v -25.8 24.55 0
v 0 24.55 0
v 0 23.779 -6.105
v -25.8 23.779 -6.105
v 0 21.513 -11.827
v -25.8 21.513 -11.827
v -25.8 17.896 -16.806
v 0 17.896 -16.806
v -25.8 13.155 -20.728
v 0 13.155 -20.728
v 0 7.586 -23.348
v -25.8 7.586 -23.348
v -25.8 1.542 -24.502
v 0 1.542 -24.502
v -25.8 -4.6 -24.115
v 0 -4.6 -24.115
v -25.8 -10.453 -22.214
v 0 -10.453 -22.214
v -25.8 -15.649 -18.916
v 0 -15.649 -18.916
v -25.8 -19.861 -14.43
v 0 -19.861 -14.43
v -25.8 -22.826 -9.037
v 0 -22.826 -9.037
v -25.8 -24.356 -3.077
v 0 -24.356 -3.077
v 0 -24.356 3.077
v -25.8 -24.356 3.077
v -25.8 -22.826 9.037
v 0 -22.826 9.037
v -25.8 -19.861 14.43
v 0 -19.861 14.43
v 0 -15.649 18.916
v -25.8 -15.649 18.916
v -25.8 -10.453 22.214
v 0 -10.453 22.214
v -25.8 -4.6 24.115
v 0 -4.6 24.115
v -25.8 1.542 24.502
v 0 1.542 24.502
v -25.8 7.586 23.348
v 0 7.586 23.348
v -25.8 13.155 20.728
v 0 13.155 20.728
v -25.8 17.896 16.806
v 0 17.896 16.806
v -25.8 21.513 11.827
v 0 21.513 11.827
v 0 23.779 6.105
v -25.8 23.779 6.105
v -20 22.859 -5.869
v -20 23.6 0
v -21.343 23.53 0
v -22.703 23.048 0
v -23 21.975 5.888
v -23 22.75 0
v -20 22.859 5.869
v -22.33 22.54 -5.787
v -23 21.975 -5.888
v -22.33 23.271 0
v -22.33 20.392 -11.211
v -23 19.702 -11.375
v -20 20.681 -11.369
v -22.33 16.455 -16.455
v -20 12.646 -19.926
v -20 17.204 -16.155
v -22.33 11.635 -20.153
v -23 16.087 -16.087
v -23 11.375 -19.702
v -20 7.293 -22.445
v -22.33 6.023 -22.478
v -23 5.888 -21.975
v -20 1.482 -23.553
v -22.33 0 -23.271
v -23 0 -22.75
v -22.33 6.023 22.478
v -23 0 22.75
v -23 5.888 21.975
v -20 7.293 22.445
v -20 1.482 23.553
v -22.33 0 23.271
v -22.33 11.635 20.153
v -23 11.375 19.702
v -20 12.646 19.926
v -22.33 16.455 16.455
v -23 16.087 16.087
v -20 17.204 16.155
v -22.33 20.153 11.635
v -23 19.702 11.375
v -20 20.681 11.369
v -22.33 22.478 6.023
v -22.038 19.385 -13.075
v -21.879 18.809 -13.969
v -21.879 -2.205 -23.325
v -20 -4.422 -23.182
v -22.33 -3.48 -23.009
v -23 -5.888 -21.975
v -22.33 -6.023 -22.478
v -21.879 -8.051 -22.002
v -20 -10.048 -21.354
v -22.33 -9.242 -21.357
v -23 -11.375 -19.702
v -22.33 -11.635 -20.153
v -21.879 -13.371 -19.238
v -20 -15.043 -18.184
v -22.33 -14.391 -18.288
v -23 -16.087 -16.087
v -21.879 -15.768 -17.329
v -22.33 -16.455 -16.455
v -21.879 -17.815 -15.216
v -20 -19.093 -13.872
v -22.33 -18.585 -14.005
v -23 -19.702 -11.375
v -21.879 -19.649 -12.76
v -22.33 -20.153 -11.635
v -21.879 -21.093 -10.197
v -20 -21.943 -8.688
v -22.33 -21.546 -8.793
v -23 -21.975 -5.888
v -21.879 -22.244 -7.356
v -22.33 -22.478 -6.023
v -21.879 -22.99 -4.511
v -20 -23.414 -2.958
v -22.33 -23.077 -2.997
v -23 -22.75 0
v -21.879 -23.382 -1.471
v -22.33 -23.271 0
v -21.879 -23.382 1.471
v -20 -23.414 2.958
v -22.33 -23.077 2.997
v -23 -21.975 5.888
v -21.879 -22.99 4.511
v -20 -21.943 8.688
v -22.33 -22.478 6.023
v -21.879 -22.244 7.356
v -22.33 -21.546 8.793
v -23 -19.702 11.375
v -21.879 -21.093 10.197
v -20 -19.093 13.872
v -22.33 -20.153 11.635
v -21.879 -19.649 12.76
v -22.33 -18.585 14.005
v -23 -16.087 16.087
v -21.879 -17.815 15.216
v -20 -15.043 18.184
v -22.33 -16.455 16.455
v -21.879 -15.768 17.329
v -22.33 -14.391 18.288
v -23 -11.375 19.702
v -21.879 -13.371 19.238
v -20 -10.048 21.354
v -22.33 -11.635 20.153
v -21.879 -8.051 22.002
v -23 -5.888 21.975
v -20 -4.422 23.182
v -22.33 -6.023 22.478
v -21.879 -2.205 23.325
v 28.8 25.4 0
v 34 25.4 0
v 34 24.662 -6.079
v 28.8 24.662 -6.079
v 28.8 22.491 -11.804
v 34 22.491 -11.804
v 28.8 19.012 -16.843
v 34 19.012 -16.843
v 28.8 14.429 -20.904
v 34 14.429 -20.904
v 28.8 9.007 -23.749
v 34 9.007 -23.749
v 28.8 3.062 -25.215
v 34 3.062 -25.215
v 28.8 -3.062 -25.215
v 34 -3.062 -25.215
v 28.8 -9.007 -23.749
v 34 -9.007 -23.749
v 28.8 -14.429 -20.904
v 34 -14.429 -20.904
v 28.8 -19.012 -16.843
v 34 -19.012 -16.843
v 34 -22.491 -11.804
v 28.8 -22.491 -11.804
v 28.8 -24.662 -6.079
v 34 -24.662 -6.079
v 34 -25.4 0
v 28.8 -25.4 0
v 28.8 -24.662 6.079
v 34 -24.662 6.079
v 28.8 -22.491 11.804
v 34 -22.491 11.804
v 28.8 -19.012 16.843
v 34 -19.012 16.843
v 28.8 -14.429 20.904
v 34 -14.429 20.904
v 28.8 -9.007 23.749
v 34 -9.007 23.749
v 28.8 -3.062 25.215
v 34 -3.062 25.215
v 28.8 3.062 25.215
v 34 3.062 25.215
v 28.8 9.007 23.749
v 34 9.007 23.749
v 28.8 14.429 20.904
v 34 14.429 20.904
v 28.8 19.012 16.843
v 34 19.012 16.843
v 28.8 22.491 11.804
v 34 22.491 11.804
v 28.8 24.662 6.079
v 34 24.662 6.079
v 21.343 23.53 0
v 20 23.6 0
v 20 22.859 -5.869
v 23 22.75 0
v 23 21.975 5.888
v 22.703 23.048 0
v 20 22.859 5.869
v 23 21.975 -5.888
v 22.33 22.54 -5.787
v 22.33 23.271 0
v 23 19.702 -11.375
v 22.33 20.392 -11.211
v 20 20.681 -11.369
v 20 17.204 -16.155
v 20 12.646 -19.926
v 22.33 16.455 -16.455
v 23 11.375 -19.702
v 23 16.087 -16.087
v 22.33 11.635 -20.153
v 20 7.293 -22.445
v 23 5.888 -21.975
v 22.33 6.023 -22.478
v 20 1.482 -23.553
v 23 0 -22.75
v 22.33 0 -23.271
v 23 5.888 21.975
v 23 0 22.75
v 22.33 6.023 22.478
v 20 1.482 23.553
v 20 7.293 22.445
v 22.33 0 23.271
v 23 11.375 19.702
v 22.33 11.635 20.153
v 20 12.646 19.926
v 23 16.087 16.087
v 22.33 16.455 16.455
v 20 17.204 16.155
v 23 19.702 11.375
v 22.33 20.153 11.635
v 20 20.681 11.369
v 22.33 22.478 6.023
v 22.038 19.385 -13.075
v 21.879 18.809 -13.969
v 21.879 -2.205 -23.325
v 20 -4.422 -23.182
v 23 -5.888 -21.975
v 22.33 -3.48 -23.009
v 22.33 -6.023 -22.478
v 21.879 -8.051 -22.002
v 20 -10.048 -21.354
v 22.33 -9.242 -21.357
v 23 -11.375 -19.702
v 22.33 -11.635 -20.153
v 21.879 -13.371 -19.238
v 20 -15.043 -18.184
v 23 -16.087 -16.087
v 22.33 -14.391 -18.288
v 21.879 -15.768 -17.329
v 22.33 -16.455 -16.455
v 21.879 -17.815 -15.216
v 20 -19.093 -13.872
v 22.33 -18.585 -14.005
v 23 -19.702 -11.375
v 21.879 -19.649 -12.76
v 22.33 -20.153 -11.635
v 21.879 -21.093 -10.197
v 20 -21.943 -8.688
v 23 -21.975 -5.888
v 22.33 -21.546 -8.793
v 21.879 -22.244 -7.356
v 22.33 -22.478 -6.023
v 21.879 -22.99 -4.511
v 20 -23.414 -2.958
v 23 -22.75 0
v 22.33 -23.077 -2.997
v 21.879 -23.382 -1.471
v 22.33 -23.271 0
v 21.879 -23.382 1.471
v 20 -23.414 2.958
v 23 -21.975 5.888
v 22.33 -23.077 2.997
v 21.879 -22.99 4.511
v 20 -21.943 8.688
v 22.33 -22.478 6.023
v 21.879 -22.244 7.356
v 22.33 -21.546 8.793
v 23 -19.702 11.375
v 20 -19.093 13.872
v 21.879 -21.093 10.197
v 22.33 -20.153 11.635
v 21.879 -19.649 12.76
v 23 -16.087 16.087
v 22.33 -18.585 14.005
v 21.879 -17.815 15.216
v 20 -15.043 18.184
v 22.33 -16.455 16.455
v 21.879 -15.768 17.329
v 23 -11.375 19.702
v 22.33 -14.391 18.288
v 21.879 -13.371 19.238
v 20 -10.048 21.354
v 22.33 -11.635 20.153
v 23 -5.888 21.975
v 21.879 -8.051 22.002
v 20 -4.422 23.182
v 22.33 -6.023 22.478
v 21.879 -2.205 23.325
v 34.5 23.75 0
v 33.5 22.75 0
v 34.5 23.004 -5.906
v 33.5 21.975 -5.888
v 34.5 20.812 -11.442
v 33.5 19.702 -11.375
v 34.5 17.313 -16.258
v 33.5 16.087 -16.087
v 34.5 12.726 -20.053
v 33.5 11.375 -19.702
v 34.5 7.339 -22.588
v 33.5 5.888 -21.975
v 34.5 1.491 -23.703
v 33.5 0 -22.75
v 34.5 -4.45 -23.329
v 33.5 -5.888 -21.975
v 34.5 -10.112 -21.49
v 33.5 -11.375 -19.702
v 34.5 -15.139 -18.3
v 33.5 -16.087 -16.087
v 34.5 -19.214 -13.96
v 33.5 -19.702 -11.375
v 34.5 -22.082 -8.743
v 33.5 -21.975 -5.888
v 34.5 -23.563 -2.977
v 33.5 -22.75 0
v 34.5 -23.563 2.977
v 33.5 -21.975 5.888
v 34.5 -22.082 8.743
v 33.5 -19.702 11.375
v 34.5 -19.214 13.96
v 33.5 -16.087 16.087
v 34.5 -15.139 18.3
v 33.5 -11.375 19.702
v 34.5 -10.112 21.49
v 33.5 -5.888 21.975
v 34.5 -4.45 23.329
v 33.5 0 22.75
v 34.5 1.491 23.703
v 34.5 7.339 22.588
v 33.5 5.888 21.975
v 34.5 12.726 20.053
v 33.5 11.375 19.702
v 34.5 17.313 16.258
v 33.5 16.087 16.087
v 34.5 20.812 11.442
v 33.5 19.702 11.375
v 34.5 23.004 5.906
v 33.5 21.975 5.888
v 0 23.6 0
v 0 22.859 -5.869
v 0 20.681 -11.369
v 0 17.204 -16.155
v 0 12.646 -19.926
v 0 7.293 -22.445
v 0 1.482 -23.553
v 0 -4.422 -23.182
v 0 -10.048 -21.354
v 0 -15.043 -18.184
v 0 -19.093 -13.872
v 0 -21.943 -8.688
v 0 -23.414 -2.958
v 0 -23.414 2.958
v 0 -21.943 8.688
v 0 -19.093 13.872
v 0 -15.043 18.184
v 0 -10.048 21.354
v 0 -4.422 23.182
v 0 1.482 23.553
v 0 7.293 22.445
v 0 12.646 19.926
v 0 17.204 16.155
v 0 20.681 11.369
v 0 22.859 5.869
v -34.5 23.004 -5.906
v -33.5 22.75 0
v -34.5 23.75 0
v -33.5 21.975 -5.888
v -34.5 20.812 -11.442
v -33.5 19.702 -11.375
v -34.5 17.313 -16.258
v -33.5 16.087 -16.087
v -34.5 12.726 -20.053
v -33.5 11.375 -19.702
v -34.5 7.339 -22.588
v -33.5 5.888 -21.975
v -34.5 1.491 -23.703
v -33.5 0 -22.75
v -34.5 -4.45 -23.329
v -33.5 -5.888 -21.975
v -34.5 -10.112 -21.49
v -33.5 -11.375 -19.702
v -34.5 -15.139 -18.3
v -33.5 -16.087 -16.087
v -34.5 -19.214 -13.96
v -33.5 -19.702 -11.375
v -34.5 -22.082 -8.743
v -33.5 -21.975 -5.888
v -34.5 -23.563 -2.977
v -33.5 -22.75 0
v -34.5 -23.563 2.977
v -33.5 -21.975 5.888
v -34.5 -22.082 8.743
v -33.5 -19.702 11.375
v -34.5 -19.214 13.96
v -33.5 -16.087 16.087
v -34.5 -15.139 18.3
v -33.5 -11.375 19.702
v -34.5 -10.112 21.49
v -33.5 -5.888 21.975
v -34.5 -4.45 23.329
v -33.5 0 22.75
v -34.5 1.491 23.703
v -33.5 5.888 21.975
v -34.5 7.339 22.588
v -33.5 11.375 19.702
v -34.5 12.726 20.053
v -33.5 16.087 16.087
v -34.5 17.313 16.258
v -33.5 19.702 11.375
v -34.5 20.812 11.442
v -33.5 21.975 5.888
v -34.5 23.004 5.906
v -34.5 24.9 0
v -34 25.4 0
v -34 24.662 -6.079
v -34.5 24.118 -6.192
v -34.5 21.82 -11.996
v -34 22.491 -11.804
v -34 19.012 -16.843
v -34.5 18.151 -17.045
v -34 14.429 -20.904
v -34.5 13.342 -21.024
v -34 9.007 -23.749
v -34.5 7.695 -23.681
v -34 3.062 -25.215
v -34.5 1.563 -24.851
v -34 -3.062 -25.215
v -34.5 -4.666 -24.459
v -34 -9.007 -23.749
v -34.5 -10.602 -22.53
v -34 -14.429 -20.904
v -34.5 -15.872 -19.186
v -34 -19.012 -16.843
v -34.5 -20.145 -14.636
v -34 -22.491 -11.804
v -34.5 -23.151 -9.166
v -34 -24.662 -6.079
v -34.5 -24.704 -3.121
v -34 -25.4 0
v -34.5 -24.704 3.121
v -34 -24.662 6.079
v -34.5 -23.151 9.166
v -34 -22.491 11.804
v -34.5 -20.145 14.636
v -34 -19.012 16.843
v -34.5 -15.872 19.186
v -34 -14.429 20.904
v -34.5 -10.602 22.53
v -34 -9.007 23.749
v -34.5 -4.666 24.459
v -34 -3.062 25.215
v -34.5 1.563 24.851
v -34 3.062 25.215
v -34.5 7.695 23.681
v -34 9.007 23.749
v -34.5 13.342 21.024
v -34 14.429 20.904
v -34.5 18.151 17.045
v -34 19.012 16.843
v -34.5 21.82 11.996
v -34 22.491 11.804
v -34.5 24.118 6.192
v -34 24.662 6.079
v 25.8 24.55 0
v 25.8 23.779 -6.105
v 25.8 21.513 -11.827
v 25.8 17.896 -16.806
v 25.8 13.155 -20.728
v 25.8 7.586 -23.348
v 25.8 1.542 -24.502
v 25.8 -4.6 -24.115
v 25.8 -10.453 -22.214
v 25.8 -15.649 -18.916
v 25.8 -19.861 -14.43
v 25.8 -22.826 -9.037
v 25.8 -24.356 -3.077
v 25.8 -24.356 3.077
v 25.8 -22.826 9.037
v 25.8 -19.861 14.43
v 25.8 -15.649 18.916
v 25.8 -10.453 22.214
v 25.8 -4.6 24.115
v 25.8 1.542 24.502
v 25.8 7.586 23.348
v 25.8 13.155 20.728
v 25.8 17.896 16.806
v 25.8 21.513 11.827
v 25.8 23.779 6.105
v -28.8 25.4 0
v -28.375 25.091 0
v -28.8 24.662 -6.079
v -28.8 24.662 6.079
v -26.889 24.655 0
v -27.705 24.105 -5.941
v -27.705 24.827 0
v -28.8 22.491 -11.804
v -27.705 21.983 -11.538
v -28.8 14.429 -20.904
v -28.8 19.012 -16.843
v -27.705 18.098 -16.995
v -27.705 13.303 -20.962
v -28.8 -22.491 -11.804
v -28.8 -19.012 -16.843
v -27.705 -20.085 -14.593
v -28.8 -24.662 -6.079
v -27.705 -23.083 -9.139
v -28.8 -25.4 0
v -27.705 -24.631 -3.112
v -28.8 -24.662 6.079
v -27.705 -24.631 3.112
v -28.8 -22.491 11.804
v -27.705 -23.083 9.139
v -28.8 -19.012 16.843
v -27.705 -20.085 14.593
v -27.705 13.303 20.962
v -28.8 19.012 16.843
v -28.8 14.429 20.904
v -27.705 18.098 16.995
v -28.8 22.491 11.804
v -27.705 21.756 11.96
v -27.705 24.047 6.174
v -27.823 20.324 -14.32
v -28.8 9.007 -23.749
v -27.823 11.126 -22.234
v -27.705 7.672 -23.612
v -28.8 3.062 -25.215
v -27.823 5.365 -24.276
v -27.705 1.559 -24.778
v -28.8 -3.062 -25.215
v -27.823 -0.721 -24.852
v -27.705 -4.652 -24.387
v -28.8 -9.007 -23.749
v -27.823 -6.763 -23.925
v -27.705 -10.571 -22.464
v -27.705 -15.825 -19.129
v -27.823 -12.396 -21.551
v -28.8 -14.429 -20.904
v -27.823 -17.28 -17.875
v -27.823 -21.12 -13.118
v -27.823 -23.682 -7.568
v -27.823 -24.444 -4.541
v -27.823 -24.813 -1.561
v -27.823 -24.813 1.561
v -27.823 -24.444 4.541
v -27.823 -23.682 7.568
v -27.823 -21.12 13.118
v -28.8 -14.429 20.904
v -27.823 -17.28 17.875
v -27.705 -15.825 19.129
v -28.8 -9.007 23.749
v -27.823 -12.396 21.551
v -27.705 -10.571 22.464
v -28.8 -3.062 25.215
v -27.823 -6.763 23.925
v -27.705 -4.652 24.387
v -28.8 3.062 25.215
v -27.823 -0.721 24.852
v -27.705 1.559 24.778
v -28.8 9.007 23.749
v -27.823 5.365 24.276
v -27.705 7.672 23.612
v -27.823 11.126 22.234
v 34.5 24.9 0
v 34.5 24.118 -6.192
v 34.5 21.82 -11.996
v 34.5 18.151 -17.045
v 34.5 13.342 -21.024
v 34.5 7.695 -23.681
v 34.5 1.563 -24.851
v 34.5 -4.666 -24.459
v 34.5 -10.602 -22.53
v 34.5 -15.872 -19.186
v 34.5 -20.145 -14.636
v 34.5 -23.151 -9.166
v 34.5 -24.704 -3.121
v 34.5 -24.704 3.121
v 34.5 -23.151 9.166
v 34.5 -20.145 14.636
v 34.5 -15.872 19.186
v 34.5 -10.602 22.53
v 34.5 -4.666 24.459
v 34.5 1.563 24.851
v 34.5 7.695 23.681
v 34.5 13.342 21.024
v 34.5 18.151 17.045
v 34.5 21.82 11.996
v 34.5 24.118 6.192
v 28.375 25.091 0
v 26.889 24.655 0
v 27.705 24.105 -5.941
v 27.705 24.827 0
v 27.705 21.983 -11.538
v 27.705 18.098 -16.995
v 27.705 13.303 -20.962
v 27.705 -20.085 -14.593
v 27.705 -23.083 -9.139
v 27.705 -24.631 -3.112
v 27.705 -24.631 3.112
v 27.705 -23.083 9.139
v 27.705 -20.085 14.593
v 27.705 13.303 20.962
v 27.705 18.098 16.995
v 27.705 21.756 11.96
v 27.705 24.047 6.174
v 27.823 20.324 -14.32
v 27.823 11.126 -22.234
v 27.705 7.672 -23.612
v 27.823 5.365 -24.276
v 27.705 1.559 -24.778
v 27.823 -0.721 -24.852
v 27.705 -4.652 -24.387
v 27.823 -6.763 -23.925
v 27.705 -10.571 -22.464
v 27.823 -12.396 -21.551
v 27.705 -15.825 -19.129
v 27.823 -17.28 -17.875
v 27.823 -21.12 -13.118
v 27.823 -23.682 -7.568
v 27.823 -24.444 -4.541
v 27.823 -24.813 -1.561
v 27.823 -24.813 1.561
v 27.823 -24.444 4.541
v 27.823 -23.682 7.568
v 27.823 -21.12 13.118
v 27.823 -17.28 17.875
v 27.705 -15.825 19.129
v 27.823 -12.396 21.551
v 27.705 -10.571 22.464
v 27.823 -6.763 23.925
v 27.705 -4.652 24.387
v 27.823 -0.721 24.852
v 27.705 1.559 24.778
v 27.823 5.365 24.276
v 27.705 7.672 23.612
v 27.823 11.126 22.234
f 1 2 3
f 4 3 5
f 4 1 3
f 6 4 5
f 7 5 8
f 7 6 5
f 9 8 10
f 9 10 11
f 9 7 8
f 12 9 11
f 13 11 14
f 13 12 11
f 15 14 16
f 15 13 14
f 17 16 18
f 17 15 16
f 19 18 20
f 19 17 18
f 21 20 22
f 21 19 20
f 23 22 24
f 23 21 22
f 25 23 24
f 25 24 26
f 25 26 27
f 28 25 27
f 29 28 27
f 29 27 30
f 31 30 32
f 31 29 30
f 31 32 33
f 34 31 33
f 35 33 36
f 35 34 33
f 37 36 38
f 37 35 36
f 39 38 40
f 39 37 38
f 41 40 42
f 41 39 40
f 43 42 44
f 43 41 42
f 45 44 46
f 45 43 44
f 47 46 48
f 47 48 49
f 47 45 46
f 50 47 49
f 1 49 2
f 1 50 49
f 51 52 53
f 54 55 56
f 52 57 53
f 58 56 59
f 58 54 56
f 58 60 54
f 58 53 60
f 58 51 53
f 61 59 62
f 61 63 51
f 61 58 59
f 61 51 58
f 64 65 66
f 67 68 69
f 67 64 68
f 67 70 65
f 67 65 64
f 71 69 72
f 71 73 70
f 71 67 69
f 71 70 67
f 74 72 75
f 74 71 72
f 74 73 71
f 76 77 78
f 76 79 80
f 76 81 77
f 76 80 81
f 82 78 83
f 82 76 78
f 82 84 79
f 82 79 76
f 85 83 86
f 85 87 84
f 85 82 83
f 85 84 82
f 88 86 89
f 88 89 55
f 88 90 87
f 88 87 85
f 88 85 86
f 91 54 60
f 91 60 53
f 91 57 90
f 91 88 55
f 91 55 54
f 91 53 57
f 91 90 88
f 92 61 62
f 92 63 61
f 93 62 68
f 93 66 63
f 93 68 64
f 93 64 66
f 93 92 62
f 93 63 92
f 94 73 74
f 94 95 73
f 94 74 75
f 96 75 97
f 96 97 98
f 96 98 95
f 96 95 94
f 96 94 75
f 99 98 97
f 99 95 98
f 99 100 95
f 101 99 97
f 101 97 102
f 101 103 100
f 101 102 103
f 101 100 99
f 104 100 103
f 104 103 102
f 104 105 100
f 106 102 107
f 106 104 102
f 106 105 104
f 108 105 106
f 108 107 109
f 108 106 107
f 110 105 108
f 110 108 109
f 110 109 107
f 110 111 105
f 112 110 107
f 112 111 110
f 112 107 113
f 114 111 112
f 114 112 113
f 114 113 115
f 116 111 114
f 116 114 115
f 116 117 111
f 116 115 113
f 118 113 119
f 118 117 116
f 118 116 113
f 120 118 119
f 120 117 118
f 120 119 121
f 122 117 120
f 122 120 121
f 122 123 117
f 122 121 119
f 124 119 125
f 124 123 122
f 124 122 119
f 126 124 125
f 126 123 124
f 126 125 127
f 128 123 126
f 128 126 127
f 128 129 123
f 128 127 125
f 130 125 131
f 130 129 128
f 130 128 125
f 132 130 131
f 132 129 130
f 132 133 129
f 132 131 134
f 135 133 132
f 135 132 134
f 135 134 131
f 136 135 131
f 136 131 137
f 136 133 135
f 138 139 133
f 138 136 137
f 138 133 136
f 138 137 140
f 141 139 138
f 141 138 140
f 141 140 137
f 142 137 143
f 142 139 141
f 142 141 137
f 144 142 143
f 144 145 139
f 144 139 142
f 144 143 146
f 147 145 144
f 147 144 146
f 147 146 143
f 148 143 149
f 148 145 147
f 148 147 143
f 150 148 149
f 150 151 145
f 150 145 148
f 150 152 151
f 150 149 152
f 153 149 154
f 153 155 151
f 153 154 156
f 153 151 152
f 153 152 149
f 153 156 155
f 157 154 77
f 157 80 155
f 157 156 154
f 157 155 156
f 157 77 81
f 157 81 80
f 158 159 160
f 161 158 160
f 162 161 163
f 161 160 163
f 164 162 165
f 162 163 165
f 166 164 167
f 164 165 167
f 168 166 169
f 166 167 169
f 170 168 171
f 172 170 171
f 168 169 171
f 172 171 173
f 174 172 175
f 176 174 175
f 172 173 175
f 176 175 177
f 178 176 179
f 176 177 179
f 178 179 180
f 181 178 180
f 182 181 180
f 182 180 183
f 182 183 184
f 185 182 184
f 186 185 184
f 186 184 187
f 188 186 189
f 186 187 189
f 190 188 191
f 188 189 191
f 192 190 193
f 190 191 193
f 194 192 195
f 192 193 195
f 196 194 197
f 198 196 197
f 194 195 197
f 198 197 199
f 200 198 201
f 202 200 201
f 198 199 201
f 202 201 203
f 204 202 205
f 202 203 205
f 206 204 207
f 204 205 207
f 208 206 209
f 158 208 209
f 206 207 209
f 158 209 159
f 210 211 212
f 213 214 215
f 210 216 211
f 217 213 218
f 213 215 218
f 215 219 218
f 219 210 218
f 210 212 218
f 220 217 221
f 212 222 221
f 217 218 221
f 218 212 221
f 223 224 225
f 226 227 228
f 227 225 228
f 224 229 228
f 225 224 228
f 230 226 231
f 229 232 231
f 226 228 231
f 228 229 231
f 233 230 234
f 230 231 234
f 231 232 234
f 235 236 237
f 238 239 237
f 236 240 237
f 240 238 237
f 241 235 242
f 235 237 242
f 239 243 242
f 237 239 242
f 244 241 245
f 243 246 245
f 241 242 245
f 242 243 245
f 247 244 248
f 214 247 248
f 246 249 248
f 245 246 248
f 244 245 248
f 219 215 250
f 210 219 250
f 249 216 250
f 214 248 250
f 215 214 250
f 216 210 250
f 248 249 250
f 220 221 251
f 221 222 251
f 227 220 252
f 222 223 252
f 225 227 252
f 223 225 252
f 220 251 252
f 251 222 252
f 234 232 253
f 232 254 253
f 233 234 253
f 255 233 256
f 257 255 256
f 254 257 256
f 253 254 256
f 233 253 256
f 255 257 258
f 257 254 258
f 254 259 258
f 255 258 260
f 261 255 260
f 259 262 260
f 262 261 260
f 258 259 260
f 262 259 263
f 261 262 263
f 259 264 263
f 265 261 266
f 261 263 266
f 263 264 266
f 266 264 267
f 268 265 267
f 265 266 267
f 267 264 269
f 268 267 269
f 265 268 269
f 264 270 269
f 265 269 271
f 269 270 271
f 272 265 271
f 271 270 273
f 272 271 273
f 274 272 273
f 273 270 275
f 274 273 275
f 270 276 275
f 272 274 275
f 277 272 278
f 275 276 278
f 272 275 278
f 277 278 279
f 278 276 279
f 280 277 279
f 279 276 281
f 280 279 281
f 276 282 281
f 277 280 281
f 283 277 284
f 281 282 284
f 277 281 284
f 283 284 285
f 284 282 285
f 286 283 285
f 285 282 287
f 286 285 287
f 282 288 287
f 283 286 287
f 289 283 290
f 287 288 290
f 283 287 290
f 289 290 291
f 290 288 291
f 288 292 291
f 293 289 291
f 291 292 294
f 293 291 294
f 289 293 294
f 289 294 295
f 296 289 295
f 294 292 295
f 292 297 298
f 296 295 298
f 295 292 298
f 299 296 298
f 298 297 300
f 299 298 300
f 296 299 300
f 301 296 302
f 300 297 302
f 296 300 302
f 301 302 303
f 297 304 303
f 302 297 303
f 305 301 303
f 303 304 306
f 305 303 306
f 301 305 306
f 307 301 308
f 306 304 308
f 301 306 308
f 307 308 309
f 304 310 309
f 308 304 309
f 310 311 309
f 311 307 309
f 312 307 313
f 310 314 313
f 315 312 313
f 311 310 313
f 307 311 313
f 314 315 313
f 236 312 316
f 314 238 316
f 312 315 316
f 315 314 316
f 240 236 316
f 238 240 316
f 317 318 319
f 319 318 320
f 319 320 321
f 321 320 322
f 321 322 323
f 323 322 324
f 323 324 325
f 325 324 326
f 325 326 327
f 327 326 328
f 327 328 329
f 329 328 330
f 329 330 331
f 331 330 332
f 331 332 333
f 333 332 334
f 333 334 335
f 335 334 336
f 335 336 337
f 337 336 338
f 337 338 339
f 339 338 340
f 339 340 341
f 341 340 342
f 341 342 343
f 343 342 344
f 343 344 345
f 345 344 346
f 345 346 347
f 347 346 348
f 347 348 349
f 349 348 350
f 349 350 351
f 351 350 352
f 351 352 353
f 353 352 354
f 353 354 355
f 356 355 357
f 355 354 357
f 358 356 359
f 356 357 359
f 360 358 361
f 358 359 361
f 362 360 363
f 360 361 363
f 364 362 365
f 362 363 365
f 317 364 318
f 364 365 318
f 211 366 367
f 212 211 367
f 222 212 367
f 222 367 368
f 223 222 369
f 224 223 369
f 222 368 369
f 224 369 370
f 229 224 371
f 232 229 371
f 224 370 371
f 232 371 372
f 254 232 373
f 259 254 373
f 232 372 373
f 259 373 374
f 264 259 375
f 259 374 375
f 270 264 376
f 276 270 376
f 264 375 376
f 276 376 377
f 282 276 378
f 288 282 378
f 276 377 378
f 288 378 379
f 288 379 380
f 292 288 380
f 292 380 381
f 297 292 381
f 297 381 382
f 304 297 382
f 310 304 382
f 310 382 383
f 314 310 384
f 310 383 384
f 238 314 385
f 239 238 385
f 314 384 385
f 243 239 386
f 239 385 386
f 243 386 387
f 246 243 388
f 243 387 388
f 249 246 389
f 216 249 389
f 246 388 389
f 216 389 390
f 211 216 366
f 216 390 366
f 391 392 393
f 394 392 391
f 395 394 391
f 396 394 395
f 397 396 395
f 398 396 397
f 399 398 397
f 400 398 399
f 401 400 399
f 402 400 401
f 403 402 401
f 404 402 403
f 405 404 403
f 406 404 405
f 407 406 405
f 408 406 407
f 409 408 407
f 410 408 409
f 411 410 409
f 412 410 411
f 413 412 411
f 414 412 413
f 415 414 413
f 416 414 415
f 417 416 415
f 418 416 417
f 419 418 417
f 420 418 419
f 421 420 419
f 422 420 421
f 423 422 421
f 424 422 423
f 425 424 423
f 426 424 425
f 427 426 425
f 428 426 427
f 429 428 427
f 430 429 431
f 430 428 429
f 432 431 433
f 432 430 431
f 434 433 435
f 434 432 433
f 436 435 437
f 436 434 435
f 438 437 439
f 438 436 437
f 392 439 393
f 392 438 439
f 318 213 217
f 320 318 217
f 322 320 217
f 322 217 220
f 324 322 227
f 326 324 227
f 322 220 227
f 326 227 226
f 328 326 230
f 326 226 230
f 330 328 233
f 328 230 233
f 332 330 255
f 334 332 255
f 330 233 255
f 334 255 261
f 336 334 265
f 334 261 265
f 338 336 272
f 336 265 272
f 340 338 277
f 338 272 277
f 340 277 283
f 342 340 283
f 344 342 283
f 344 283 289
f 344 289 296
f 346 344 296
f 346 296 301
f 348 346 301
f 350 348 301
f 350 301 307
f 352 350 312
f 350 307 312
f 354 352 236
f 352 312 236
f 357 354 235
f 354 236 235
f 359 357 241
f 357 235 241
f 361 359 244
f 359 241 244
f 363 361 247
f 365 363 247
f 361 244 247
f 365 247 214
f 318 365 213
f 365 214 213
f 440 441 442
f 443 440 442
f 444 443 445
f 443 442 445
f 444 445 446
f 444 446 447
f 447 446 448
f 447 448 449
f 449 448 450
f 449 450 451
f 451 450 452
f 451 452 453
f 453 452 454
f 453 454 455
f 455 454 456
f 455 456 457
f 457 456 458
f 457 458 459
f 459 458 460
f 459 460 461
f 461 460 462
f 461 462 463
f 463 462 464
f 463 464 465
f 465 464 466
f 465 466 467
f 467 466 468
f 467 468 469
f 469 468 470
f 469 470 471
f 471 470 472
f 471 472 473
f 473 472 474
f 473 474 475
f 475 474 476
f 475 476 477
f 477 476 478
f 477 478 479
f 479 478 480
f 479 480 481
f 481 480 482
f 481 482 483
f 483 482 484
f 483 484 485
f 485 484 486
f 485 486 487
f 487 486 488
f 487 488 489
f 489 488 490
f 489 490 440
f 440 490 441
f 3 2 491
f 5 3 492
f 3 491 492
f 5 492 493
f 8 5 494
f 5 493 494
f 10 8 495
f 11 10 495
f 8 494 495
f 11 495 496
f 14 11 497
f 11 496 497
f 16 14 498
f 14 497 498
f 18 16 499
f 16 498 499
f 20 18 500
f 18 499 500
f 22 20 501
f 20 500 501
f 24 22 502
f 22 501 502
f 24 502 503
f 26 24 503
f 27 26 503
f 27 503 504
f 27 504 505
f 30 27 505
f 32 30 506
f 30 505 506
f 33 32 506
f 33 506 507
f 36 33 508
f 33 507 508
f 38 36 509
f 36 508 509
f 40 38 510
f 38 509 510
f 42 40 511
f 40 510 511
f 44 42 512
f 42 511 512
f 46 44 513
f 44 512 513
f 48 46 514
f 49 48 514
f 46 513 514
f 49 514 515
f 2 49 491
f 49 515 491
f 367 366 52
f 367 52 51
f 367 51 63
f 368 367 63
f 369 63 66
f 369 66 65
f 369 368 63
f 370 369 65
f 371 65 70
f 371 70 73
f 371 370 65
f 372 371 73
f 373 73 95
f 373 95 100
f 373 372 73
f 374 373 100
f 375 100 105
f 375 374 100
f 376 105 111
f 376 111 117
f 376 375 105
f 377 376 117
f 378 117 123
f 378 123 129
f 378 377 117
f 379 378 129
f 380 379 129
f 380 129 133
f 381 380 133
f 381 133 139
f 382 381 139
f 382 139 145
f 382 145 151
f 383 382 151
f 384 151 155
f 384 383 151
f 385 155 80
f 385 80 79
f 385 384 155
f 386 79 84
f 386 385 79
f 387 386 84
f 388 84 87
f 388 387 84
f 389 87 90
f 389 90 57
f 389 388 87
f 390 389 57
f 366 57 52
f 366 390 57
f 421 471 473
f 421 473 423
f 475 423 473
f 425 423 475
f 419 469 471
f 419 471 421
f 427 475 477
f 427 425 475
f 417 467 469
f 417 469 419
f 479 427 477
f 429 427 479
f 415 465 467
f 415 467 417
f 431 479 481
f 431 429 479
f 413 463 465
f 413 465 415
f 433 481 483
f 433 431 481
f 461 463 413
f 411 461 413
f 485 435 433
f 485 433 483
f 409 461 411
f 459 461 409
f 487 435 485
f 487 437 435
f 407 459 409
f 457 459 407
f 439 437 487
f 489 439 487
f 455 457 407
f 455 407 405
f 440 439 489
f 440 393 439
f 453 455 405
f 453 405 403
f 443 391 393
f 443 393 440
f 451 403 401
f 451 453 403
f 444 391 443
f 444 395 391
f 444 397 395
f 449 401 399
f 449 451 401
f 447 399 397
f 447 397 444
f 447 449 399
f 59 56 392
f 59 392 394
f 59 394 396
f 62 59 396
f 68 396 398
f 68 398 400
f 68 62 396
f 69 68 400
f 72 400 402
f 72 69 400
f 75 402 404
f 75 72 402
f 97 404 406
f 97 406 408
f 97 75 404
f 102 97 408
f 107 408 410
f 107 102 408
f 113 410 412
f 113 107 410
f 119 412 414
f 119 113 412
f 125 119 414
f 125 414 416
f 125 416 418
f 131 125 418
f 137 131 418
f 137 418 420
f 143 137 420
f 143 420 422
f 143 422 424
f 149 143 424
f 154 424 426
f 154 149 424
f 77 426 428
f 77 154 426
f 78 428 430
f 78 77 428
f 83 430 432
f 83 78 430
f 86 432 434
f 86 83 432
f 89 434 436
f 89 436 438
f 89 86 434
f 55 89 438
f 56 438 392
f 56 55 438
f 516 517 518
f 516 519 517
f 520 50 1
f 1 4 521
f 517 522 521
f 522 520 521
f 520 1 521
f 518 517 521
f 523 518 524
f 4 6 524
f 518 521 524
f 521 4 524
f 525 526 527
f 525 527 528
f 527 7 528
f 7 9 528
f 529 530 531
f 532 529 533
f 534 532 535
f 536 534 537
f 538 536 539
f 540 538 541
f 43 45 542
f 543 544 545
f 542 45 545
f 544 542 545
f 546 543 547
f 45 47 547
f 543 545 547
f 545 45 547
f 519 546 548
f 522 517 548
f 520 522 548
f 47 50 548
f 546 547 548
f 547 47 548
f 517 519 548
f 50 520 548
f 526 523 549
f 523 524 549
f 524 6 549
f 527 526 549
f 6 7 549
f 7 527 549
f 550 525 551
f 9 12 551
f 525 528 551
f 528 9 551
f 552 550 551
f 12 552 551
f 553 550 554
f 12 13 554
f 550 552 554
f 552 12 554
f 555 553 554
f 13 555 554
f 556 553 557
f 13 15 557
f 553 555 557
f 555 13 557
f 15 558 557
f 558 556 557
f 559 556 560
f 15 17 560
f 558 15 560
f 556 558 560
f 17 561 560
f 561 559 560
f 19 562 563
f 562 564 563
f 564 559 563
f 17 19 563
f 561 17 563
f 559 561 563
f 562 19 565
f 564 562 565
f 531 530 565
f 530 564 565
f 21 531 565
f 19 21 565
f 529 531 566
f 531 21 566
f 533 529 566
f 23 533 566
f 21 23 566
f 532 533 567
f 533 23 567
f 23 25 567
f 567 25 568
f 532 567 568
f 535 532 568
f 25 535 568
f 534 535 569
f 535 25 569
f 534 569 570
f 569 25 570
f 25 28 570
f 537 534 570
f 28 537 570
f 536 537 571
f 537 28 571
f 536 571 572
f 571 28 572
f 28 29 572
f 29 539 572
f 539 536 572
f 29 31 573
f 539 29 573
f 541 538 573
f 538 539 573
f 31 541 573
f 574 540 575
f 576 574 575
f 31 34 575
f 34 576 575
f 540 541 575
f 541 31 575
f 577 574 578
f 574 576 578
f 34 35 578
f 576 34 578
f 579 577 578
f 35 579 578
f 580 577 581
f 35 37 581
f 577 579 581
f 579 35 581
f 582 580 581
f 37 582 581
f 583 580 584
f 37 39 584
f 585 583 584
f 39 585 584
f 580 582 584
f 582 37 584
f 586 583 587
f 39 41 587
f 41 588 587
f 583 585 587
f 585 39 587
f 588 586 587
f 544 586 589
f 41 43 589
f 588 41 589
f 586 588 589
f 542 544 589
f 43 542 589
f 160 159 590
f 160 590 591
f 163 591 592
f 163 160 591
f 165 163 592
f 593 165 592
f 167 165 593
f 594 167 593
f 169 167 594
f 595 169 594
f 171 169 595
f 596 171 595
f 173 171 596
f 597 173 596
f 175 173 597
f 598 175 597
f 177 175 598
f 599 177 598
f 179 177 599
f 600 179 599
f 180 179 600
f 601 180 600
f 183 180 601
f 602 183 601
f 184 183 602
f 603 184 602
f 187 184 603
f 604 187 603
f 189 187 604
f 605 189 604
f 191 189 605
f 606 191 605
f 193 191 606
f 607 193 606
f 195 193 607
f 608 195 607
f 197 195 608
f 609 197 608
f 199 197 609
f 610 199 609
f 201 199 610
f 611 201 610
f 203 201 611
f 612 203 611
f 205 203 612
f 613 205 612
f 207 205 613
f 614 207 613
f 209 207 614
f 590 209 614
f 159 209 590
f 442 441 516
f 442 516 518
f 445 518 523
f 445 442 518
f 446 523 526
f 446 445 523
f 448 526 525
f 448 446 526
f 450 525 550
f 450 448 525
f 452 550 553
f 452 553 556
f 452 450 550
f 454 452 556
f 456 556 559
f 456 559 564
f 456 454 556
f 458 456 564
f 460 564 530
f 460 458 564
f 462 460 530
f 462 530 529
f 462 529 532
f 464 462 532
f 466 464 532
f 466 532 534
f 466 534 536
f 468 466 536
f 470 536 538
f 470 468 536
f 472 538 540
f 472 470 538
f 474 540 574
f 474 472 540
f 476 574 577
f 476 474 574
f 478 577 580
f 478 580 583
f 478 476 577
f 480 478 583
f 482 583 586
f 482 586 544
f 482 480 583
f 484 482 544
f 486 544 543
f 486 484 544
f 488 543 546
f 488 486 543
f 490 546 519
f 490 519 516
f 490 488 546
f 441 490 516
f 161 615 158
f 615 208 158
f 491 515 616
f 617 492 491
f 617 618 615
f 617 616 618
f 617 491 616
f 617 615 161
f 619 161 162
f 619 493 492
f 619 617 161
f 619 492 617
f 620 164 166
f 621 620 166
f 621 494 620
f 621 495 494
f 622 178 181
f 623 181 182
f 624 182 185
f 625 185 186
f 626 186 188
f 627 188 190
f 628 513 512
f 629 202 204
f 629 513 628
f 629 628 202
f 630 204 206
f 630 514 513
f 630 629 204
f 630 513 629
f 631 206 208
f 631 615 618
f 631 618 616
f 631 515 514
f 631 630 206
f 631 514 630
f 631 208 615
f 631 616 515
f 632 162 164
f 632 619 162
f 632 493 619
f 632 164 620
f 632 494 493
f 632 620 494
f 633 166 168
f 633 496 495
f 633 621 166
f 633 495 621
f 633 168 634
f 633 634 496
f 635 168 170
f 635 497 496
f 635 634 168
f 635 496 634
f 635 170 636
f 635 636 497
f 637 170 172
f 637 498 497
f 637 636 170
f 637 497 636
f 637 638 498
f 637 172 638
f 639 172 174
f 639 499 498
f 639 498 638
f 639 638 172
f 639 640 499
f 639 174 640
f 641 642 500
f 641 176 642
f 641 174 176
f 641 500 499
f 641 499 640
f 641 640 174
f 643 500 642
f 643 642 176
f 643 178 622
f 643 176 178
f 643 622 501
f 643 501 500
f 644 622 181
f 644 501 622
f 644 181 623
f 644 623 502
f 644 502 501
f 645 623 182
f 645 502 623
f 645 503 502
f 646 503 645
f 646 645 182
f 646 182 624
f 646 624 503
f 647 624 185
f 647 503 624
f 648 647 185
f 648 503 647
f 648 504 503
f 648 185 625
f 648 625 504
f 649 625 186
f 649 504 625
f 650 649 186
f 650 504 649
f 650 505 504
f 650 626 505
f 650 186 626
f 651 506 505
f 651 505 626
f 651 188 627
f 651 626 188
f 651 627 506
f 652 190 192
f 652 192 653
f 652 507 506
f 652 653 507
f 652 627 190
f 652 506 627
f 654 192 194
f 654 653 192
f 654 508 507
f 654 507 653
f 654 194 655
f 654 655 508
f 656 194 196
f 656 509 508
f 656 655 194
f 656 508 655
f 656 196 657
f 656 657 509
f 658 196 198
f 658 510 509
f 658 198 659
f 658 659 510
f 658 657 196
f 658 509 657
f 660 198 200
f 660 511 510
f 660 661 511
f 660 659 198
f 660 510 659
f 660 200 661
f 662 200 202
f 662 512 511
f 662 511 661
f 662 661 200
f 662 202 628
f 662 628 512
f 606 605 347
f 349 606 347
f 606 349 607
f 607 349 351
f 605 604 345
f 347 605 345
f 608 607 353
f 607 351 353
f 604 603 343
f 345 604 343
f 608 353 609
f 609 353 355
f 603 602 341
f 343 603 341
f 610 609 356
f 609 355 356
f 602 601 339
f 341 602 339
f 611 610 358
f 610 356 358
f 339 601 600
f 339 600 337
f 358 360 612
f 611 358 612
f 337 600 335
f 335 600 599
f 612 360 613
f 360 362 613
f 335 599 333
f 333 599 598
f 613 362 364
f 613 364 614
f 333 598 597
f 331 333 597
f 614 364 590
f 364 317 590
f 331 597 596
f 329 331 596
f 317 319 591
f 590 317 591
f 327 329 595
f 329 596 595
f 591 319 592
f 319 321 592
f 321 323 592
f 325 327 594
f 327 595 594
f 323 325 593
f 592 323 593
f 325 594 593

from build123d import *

# Parameters (mm, degrees)
F2_SIZE = 0.5
F3_SIZE = 1


with BuildPart() as f1:
    # F0 (on Top) → F1 (revolve)
    with BuildSketch(Plane.XY):
        with BuildLine():
            Line((-34.5, 25.4), (-34.5, 22.75))
            Line((-34.5, 22.75), (-25.8, 22.75))
            Line((-25.8, 22.75), (-23, 22.75))
            add(Edge.make_bspline(
                [(-23, 22.75), (-22.4767401814, 23.4261993319), (-21.5331446379, 23.6), (-20, 23.6)],
                knots=[0, 0, 0, 0, 3.1180923655, 3.1180923655, 3.1180923655, 3.1180923655], degree=3))
            Line((-20, 23.6), (0, 23.6))
            Line((0, 23.6), (0, 24.55))
            Line((0, 24.55), (-25.8, 24.55))
            add(Edge.make_bspline(
                [(-28.8, 25.4), (-28.3960923553, 25.0019170344), (-27.5980718434, 24.6472395957), (-25.8, 24.55)],
                knots=[0, 0, 0, 0, 3.1180923655, 3.1180923655, 3.1180923655, 3.1180923655], degree=3))
            Line((-28.8, 25.4), (-34.5, 25.4))
        make_face()
    revolve(axis=Axis((-33.9306145906, 0, 0), (-1, 0, 0)))

    # F2
    f2_edges = [f1.edges().sort_by_distance(p)[0] for p in [
        (-34.5, -25.4, 0),
    ]]
    chamfer(f2_edges, length=F2_SIZE)

    # F3
    f3_edges = [f1.edges().sort_by_distance(p)[0] for p in [
        (-34.5, -22.75, 0),
    ]]
    chamfer(f3_edges, length=F3_SIZE)

    # F4: F1 across face


with BuildPart() as f1_1:
    add(f1.part)
    add(f1.part.mirror(Plane.YZ))


solid = f1_1.part
